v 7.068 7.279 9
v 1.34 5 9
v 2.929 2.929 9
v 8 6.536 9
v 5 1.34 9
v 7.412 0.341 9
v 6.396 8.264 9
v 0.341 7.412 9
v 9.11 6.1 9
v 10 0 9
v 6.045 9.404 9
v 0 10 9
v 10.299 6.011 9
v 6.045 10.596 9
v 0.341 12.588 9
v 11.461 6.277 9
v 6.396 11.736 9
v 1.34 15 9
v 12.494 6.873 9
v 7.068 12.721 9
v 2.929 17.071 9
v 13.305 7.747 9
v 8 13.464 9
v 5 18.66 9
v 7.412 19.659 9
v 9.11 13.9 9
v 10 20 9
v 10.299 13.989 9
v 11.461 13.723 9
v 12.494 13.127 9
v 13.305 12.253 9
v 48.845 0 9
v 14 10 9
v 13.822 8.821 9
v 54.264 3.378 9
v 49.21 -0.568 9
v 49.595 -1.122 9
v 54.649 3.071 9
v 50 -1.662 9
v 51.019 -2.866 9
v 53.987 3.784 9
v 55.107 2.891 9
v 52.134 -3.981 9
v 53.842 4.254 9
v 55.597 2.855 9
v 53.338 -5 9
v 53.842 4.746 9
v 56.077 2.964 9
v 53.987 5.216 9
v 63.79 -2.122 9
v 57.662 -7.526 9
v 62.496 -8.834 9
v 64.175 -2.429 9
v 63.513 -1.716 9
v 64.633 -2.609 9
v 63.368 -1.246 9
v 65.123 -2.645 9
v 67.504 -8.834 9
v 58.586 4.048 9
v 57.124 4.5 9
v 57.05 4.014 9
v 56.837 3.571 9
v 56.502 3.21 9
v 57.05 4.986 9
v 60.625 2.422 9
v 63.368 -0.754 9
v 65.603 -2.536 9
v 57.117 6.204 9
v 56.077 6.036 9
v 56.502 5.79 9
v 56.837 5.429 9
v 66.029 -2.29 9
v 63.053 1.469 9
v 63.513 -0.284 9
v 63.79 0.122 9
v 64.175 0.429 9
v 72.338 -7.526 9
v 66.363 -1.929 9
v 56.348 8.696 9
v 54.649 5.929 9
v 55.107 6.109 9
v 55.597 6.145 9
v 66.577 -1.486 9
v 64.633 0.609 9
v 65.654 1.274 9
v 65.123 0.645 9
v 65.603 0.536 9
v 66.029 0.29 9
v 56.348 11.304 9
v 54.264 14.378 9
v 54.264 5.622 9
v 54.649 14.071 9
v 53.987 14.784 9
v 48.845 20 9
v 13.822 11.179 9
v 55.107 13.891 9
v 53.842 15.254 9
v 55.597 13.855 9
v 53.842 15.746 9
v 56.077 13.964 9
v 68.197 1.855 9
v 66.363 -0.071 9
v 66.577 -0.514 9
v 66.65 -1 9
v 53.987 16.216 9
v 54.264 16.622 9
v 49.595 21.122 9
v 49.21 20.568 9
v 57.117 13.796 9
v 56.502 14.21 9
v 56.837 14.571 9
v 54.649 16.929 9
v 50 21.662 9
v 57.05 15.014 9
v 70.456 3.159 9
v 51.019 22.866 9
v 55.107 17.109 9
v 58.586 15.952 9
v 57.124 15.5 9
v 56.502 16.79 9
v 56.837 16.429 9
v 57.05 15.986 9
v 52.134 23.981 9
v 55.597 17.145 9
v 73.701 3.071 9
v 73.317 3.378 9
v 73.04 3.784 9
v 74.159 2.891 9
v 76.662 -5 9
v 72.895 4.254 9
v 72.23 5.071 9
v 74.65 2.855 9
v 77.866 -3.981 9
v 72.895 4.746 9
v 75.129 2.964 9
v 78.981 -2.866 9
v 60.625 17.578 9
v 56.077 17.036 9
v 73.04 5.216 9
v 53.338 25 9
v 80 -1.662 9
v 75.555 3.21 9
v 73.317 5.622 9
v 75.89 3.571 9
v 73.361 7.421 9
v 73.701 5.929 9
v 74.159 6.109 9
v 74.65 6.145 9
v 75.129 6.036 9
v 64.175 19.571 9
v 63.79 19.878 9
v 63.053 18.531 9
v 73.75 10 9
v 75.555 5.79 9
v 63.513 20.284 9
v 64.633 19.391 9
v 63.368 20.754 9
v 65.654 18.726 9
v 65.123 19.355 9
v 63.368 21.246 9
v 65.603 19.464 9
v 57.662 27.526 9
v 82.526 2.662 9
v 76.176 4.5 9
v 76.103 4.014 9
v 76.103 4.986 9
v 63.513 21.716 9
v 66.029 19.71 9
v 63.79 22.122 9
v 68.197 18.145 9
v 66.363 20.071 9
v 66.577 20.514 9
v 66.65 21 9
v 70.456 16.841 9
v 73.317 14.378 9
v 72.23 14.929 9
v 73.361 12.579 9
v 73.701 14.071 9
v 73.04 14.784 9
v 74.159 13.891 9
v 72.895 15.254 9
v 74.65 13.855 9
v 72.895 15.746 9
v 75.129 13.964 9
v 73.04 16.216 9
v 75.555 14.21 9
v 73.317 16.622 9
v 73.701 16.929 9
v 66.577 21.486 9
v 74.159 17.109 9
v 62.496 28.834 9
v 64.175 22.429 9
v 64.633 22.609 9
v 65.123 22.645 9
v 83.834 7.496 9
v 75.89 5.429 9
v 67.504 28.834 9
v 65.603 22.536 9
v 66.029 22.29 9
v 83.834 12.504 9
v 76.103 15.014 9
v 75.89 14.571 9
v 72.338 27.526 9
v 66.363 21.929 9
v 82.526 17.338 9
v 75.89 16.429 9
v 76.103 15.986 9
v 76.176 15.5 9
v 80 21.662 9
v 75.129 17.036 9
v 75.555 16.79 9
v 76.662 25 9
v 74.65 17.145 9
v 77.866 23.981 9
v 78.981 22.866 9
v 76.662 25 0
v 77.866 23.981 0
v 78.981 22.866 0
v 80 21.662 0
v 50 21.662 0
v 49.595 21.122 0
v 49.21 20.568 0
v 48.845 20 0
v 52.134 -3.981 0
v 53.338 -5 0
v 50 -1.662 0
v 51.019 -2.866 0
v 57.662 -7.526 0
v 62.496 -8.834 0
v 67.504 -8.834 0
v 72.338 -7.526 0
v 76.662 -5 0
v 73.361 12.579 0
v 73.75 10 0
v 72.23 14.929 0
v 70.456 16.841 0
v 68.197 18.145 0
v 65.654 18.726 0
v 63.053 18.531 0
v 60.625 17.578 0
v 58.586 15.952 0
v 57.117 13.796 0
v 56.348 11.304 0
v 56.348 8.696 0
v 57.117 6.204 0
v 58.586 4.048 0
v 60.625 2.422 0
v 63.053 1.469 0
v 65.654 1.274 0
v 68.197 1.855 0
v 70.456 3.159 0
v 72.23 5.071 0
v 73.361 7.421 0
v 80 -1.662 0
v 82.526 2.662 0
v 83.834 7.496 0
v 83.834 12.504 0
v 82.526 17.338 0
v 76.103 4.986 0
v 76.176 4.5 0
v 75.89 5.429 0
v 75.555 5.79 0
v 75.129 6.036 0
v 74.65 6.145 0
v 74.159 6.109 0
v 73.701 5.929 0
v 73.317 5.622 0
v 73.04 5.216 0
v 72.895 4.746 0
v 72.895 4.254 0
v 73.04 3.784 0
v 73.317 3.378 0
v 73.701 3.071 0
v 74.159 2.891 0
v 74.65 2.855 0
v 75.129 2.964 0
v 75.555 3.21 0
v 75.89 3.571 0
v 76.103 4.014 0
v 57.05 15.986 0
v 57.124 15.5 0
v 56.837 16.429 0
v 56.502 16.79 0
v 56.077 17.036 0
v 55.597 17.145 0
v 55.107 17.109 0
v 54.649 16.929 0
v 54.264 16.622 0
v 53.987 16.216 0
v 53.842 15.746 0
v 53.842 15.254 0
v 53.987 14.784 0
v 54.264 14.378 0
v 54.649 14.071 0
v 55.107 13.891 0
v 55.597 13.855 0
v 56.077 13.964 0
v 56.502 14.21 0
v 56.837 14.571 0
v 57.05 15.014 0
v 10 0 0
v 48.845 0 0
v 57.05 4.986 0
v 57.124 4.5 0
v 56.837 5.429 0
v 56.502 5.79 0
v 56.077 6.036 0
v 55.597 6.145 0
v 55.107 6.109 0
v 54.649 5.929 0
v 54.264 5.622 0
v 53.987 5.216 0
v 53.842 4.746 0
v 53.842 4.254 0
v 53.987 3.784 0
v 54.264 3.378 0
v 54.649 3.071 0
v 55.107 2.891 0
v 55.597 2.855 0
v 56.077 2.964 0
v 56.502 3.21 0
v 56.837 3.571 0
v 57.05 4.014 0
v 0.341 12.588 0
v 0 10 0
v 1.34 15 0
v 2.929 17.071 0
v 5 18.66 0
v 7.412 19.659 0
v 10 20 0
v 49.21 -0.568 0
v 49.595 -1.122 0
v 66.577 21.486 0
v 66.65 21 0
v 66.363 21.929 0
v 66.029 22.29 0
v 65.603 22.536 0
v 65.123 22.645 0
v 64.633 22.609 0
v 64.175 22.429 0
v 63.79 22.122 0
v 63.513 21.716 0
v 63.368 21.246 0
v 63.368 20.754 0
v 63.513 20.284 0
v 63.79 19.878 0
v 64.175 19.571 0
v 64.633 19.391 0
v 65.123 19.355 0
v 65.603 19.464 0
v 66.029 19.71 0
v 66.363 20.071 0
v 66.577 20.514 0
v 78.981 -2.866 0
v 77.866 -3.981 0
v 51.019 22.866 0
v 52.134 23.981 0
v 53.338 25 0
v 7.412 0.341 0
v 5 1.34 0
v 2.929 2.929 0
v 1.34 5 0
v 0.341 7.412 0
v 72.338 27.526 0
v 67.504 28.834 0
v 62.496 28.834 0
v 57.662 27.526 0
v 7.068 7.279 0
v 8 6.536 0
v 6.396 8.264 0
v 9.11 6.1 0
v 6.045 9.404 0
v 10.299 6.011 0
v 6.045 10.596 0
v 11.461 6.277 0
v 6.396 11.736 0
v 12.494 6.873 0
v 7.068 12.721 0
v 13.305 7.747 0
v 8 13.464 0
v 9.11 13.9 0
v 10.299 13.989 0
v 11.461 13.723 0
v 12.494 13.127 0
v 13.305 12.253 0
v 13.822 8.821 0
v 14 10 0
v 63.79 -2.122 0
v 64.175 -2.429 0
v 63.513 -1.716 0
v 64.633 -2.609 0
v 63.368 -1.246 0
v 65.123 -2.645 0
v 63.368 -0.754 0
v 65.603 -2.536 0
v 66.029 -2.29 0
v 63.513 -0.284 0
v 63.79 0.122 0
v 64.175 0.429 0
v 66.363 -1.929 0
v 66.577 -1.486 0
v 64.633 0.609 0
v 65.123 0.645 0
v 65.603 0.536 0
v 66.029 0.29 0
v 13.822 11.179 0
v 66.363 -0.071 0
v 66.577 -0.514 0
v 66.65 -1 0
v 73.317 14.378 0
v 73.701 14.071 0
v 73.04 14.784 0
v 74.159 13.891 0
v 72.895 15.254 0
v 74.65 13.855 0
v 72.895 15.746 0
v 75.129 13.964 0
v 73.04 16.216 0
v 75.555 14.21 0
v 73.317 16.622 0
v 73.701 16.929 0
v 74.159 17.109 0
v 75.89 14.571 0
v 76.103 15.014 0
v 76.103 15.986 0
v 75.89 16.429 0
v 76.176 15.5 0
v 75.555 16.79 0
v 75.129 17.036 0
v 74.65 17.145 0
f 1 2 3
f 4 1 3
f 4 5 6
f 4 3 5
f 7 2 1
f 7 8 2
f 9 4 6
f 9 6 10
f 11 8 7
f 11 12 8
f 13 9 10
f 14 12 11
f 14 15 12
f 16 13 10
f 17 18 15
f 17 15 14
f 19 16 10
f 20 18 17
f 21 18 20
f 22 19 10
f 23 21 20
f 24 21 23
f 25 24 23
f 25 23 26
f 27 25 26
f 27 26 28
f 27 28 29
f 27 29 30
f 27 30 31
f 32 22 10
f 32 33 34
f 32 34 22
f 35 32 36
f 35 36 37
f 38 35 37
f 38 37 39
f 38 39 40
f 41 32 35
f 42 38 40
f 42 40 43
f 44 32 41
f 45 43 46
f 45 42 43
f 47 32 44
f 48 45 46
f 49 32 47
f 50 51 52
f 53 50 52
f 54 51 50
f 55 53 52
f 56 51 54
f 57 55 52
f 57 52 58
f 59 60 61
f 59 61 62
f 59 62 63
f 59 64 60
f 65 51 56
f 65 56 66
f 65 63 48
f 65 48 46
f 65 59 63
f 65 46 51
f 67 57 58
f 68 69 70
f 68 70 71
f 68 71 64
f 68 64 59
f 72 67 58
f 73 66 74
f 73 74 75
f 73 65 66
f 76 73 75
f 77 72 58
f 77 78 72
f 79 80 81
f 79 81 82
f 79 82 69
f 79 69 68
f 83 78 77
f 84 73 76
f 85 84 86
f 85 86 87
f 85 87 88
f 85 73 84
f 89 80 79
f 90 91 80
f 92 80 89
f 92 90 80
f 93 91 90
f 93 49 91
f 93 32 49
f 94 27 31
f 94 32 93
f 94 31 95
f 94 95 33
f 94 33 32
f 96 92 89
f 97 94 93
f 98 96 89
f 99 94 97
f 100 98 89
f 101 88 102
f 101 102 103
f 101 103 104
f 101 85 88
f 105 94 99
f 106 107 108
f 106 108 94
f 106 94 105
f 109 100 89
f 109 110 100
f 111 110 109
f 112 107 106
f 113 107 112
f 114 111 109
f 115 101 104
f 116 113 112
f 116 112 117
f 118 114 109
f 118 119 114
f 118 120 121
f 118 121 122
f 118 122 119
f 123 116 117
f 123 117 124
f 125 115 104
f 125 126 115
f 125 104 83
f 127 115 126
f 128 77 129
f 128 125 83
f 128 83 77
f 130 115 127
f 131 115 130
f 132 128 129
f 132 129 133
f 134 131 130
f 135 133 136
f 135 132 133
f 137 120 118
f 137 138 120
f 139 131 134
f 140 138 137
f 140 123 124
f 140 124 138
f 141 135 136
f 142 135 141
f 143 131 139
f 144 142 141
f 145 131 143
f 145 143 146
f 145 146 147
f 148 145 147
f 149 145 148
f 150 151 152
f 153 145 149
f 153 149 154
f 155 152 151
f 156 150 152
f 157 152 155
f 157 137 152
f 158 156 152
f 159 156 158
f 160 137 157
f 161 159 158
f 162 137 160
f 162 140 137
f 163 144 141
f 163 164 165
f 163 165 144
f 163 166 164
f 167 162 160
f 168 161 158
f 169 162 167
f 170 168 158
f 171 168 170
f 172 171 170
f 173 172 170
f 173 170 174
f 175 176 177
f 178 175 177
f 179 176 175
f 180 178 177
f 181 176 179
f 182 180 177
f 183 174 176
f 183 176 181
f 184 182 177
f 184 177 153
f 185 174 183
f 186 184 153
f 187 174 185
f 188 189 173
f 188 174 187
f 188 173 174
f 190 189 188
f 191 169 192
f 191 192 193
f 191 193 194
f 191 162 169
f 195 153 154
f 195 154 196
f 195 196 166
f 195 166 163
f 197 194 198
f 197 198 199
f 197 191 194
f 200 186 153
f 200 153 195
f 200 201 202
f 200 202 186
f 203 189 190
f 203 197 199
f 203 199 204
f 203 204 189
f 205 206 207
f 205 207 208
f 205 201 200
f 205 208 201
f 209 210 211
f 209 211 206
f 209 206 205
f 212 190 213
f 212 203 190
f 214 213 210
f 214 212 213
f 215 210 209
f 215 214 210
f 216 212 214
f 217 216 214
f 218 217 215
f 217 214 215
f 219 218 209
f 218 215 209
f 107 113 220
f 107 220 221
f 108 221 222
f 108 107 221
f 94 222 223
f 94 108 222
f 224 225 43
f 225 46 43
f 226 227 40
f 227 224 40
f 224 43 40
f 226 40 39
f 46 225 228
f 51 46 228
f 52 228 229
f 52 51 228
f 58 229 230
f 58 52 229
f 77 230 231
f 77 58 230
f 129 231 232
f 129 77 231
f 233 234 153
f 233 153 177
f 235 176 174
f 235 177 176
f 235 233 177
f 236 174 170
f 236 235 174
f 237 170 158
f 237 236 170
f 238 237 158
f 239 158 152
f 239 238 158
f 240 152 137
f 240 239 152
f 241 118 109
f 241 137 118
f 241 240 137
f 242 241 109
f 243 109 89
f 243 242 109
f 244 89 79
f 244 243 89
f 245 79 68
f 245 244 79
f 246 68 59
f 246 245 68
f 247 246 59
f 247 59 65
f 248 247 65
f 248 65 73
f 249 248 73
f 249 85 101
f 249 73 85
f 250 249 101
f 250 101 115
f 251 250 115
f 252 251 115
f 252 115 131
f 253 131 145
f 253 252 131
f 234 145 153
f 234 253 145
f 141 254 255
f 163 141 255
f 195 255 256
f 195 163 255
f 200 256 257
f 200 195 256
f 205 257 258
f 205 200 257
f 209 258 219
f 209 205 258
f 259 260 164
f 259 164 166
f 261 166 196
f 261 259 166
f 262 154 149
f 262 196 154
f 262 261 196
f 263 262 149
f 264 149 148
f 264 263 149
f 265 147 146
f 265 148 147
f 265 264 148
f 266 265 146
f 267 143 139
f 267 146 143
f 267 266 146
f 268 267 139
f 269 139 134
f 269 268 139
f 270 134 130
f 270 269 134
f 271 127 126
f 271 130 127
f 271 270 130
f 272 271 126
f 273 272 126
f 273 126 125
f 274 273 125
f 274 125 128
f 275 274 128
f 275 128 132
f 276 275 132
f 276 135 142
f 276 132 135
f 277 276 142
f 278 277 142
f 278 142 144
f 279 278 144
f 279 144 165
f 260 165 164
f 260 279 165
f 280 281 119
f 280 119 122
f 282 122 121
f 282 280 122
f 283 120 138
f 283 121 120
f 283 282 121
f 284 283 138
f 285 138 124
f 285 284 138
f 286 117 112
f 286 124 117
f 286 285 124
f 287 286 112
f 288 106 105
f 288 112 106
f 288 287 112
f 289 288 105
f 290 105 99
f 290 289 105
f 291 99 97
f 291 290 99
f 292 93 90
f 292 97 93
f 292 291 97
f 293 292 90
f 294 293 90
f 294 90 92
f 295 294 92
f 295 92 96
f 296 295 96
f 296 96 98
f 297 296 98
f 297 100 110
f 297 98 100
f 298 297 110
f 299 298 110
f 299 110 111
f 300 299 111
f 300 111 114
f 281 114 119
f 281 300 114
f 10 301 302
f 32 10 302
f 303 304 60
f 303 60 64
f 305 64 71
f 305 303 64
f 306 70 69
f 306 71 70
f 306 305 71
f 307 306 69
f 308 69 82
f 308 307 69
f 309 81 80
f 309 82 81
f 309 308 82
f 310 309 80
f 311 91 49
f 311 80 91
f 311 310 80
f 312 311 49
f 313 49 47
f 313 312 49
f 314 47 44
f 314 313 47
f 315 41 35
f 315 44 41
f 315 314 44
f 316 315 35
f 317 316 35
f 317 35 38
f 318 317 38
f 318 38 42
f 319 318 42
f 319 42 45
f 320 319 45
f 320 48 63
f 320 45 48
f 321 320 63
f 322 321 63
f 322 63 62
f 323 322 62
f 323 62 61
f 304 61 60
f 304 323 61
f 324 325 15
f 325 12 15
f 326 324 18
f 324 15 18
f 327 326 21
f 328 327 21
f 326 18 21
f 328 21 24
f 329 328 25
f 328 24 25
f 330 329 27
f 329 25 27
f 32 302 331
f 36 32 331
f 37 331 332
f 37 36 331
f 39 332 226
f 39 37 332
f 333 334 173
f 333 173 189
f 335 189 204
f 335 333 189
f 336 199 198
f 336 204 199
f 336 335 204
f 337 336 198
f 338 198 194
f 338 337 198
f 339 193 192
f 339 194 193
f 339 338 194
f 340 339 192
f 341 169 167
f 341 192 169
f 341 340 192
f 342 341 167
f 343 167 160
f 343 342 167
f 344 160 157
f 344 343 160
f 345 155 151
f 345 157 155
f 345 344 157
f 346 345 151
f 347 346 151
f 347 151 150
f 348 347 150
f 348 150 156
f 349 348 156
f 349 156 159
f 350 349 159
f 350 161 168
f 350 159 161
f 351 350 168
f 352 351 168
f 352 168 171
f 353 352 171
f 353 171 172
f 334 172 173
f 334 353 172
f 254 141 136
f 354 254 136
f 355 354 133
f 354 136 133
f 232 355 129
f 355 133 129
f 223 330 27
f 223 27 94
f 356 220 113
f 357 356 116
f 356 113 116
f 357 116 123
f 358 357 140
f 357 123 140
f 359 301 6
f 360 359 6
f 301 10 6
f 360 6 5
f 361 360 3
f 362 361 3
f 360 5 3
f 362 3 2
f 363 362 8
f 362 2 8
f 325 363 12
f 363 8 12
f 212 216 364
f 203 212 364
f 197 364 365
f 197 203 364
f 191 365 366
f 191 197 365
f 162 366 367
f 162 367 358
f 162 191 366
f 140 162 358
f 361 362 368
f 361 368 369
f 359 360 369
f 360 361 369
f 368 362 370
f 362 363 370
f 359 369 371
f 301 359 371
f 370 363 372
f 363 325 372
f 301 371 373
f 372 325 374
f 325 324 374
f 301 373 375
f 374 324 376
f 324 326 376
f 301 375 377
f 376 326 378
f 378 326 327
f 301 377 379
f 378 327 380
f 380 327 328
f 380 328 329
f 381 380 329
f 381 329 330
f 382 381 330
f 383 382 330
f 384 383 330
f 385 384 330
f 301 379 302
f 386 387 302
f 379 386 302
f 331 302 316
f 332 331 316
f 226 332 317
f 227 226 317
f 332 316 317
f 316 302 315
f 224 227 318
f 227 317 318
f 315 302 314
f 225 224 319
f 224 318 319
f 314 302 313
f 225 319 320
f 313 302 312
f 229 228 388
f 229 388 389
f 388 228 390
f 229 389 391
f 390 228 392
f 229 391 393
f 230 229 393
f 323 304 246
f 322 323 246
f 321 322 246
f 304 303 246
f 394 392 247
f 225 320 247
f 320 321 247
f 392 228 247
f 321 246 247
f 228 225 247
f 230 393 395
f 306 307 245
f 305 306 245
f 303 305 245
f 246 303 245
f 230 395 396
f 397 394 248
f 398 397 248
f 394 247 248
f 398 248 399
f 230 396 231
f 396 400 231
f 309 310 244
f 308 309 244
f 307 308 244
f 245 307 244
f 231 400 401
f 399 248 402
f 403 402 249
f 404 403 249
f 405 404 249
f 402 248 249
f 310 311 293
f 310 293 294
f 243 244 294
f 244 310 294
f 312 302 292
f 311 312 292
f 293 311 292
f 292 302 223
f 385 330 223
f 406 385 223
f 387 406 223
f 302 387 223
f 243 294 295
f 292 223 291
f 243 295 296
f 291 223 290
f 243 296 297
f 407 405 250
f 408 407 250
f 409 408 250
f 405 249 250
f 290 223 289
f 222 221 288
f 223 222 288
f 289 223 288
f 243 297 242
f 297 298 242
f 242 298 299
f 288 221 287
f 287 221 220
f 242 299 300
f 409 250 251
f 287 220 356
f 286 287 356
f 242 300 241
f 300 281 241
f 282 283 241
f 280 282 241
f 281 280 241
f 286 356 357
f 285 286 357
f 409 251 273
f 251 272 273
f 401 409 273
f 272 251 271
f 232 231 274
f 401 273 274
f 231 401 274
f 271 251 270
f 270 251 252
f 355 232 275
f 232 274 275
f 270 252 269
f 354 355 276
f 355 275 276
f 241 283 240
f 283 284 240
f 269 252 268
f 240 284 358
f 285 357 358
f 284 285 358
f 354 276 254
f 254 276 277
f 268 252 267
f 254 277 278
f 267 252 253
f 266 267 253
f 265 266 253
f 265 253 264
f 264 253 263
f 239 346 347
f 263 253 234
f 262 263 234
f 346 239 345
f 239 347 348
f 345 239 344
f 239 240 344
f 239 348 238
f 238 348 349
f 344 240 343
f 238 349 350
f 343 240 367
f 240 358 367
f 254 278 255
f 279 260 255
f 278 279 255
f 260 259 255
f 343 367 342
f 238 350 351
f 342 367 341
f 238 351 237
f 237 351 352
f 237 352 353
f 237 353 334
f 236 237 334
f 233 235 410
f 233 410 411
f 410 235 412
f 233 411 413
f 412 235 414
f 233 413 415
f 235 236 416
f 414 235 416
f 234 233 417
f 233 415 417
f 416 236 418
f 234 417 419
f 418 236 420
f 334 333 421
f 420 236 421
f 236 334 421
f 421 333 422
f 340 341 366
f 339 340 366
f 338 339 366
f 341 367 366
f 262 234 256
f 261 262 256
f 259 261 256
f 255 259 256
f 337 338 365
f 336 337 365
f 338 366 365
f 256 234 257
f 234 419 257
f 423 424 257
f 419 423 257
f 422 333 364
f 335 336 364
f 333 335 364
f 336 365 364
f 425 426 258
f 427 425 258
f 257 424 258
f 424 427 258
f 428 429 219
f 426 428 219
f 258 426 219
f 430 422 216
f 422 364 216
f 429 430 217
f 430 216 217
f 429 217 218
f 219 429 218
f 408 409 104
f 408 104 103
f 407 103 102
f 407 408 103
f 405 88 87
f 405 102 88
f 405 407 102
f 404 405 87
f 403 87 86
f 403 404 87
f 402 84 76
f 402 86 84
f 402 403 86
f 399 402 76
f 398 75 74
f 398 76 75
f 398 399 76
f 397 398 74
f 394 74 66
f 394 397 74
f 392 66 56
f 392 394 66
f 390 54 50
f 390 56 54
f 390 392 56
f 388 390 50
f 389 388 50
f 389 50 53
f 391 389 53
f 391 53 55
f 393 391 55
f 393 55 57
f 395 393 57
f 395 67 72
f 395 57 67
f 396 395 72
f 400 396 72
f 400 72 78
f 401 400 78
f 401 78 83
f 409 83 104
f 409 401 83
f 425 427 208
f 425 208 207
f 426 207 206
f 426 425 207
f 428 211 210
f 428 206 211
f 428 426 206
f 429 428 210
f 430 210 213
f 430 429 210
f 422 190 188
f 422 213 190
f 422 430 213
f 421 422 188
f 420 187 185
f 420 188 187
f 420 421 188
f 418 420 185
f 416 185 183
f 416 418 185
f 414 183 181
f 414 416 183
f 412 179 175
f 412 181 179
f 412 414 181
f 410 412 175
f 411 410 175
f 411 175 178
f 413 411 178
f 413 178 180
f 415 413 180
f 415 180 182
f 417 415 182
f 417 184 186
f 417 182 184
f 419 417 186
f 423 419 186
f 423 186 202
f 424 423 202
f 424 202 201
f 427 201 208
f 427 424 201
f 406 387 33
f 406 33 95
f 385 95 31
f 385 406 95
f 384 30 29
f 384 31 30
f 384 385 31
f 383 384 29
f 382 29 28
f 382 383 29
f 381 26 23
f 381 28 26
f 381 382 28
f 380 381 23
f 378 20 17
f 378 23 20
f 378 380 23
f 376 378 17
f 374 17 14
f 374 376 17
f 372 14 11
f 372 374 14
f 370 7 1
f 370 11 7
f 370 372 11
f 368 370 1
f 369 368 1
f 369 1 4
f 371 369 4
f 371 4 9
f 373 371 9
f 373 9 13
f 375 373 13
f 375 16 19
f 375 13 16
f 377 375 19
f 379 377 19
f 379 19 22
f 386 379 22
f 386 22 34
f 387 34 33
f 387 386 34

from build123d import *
from build123d.topology import SkipClean

# Parameters (mm, degrees)
ESQUISSE1_W                  = 50
ESQUISSE1_H                  = 20
BOSS_EXTRU_1_DEPTH           = 9
ESQUISSE2_W                  = 30
ESQUISSE2_H                  = 30
BOSS_EXTRU_2_DEPTH           = 9
ENL_V_MAT_EXTRU_1_DEPTH      = 85.297093663
ENL_V_MAT_EXTRU_1_DEPTH_BACK = 85.297093663
ESQUISSE3_R                  = 8.75
ESQUISSE3_R_2                = 1.65
ENL_V_MAT_EXTRU_2_DEPTH      = 85.297093663
ENL_V_MAT_EXTRU_2_DEPTH_BACK = 85.297093663
ESQUISSE4_R                  = 4
CONG_1_R                     = 10
ESQUISSE6_R                  = 19
ESQUISSE6_R_2                = 14
BOSS_EXTRU_3_DEPTH           = 9
ENL_V_MAT_EXTRU_4_DEPTH      = 90.319650693


with BuildPart() as part:
    # Esquisse1 → Boss.-Extru.1 (new body)
    with BuildSketch(Plane.XY):
        with Locations((25, 10)):
            Rectangle(ESQUISSE1_W, ESQUISSE1_H)
    extrude(amount=BOSS_EXTRU_1_DEPTH)

    # Esquisse2 → Boss.-Extru.2 (add)
    with BuildSketch(Plane.XY.offset(9)):
        with Locations((65, 10)):
            Rectangle(ESQUISSE2_W, ESQUISSE2_H)
    extrude(amount=-BOSS_EXTRU_2_DEPTH)

    # Esquisse3 → Enlèv. mat.-Extru.1 (cut, two sides: drawn at the far end of the back side and taken through both)
    with BuildSketch(Plane.XY.offset(9).offset(-ENL_V_MAT_EXTRU_1_DEPTH_BACK)):
        with Locations((65, 10)):
            Circle(ESQUISSE3_R)
        with Locations((65, -1)):
            Circle(ESQUISSE3_R_2)
        with Locations((55.473720558, 4.5)):
            Circle(ESQUISSE3_R_2)
        with Locations((55.473720558, 15.5)):
            Circle(ESQUISSE3_R_2)
        with Locations((65, 21)):
            Circle(ESQUISSE3_R_2)
        with Locations((74.526279442, 15.5)):
            Circle(ESQUISSE3_R_2)
        with Locations((74.526279442, 4.5)):
            Circle(ESQUISSE3_R_2)
    extrude(amount=ENL_V_MAT_EXTRU_1_DEPTH + ENL_V_MAT_EXTRU_1_DEPTH_BACK, mode=Mode.SUBTRACT)

    # Esquisse4 → Enlèv. mat.-Extru.2 (cut, two sides: drawn at the far end of the back side and taken through both)
    with BuildSketch(Plane.XY.offset(9).offset(-ENL_V_MAT_EXTRU_2_DEPTH_BACK)):
        with Locations((10, 10)):
            Circle(ESQUISSE4_R)
    extrude(amount=ENL_V_MAT_EXTRU_2_DEPTH + ENL_V_MAT_EXTRU_2_DEPTH_BACK, mode=Mode.SUBTRACT)

    # Congé1
    cong_1_edges = [part.edges().sort_by_distance(p)[0] for p in [
        (0, 0, 4.5),
        (0, 20, 4.5),
    ]]
    fillet(cong_1_edges, radius=CONG_1_R - 0.0001)  # a hair under: the kernel refuses the full size

    # Esquisse6 → Boss.-Extru.3 (add)
    with BuildSketch(Plane.XY.offset(9)):
        with Locations((65, 10)):
            Circle(ESQUISSE6_R)
        with Locations((65, 10)):
            Circle(ESQUISSE6_R_2, mode=Mode.SUBTRACT)
    extrude(amount=-BOSS_EXTRU_3_DEPTH)

    # Esquisse7 → Enlèv. mat.-Extru.4 (cut, through all)
    with SkipClean():  # the faces are left unmerged after this step: merging them gives an invalid solid
        with BuildSketch(Plane.XY.offset(9)):
            with BuildLine():
                Line((48.844505579, 0), (48.844505579, -10.5))
                Line((48.844505579, -10.5), (84.844505579, -10.5))
                Line((84.844505579, -10.5), (84.844505579, 30.5))
                Line((84.844505579, 30.5), (48.844505579, 30.5))
                Line((48.844505579, 30.5), (48.844505579, 20))
                ThreePointArc((48.844505579, 20), (84, 10), (48.844505579, 0))
            make_face()
        extrude(amount=-ENL_V_MAT_EXTRU_4_DEPTH, mode=Mode.SUBTRACT)


solid = part.part
